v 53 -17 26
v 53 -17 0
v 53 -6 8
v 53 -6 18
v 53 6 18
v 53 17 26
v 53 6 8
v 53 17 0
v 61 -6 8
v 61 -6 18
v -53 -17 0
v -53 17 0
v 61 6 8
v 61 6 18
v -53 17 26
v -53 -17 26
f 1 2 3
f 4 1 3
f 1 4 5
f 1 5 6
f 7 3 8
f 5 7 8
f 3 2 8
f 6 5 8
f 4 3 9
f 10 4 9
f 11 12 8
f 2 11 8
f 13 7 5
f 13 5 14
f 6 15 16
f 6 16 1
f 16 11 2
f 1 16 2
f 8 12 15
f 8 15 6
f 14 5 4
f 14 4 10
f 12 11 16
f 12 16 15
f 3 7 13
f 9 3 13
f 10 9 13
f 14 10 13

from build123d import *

# Parameters (mm, degrees)
SKETCH1_W       = 106
SKETCH1_H       = 34
PACK_2_DEPTH    = 26
SKETCH2_W       = 8
SKETCH2_H       = 12
LEAD_EXIT_DEPTH = 10


with BuildPart() as part:
    # Sketch1 → Pack 2 (new body)
    with BuildSketch(Plane.XY):
        Rectangle(SKETCH1_W, SKETCH1_H)
    extrude(amount=PACK_2_DEPTH)

    # Sketch2 → Lead_exit (add)
    with BuildSketch(Plane.XY.offset(8)):
        with Locations((57, 0)):
            Rectangle(SKETCH2_W, SKETCH2_H)
    extrude(amount=LEAD_EXIT_DEPTH)


solid = part.part
